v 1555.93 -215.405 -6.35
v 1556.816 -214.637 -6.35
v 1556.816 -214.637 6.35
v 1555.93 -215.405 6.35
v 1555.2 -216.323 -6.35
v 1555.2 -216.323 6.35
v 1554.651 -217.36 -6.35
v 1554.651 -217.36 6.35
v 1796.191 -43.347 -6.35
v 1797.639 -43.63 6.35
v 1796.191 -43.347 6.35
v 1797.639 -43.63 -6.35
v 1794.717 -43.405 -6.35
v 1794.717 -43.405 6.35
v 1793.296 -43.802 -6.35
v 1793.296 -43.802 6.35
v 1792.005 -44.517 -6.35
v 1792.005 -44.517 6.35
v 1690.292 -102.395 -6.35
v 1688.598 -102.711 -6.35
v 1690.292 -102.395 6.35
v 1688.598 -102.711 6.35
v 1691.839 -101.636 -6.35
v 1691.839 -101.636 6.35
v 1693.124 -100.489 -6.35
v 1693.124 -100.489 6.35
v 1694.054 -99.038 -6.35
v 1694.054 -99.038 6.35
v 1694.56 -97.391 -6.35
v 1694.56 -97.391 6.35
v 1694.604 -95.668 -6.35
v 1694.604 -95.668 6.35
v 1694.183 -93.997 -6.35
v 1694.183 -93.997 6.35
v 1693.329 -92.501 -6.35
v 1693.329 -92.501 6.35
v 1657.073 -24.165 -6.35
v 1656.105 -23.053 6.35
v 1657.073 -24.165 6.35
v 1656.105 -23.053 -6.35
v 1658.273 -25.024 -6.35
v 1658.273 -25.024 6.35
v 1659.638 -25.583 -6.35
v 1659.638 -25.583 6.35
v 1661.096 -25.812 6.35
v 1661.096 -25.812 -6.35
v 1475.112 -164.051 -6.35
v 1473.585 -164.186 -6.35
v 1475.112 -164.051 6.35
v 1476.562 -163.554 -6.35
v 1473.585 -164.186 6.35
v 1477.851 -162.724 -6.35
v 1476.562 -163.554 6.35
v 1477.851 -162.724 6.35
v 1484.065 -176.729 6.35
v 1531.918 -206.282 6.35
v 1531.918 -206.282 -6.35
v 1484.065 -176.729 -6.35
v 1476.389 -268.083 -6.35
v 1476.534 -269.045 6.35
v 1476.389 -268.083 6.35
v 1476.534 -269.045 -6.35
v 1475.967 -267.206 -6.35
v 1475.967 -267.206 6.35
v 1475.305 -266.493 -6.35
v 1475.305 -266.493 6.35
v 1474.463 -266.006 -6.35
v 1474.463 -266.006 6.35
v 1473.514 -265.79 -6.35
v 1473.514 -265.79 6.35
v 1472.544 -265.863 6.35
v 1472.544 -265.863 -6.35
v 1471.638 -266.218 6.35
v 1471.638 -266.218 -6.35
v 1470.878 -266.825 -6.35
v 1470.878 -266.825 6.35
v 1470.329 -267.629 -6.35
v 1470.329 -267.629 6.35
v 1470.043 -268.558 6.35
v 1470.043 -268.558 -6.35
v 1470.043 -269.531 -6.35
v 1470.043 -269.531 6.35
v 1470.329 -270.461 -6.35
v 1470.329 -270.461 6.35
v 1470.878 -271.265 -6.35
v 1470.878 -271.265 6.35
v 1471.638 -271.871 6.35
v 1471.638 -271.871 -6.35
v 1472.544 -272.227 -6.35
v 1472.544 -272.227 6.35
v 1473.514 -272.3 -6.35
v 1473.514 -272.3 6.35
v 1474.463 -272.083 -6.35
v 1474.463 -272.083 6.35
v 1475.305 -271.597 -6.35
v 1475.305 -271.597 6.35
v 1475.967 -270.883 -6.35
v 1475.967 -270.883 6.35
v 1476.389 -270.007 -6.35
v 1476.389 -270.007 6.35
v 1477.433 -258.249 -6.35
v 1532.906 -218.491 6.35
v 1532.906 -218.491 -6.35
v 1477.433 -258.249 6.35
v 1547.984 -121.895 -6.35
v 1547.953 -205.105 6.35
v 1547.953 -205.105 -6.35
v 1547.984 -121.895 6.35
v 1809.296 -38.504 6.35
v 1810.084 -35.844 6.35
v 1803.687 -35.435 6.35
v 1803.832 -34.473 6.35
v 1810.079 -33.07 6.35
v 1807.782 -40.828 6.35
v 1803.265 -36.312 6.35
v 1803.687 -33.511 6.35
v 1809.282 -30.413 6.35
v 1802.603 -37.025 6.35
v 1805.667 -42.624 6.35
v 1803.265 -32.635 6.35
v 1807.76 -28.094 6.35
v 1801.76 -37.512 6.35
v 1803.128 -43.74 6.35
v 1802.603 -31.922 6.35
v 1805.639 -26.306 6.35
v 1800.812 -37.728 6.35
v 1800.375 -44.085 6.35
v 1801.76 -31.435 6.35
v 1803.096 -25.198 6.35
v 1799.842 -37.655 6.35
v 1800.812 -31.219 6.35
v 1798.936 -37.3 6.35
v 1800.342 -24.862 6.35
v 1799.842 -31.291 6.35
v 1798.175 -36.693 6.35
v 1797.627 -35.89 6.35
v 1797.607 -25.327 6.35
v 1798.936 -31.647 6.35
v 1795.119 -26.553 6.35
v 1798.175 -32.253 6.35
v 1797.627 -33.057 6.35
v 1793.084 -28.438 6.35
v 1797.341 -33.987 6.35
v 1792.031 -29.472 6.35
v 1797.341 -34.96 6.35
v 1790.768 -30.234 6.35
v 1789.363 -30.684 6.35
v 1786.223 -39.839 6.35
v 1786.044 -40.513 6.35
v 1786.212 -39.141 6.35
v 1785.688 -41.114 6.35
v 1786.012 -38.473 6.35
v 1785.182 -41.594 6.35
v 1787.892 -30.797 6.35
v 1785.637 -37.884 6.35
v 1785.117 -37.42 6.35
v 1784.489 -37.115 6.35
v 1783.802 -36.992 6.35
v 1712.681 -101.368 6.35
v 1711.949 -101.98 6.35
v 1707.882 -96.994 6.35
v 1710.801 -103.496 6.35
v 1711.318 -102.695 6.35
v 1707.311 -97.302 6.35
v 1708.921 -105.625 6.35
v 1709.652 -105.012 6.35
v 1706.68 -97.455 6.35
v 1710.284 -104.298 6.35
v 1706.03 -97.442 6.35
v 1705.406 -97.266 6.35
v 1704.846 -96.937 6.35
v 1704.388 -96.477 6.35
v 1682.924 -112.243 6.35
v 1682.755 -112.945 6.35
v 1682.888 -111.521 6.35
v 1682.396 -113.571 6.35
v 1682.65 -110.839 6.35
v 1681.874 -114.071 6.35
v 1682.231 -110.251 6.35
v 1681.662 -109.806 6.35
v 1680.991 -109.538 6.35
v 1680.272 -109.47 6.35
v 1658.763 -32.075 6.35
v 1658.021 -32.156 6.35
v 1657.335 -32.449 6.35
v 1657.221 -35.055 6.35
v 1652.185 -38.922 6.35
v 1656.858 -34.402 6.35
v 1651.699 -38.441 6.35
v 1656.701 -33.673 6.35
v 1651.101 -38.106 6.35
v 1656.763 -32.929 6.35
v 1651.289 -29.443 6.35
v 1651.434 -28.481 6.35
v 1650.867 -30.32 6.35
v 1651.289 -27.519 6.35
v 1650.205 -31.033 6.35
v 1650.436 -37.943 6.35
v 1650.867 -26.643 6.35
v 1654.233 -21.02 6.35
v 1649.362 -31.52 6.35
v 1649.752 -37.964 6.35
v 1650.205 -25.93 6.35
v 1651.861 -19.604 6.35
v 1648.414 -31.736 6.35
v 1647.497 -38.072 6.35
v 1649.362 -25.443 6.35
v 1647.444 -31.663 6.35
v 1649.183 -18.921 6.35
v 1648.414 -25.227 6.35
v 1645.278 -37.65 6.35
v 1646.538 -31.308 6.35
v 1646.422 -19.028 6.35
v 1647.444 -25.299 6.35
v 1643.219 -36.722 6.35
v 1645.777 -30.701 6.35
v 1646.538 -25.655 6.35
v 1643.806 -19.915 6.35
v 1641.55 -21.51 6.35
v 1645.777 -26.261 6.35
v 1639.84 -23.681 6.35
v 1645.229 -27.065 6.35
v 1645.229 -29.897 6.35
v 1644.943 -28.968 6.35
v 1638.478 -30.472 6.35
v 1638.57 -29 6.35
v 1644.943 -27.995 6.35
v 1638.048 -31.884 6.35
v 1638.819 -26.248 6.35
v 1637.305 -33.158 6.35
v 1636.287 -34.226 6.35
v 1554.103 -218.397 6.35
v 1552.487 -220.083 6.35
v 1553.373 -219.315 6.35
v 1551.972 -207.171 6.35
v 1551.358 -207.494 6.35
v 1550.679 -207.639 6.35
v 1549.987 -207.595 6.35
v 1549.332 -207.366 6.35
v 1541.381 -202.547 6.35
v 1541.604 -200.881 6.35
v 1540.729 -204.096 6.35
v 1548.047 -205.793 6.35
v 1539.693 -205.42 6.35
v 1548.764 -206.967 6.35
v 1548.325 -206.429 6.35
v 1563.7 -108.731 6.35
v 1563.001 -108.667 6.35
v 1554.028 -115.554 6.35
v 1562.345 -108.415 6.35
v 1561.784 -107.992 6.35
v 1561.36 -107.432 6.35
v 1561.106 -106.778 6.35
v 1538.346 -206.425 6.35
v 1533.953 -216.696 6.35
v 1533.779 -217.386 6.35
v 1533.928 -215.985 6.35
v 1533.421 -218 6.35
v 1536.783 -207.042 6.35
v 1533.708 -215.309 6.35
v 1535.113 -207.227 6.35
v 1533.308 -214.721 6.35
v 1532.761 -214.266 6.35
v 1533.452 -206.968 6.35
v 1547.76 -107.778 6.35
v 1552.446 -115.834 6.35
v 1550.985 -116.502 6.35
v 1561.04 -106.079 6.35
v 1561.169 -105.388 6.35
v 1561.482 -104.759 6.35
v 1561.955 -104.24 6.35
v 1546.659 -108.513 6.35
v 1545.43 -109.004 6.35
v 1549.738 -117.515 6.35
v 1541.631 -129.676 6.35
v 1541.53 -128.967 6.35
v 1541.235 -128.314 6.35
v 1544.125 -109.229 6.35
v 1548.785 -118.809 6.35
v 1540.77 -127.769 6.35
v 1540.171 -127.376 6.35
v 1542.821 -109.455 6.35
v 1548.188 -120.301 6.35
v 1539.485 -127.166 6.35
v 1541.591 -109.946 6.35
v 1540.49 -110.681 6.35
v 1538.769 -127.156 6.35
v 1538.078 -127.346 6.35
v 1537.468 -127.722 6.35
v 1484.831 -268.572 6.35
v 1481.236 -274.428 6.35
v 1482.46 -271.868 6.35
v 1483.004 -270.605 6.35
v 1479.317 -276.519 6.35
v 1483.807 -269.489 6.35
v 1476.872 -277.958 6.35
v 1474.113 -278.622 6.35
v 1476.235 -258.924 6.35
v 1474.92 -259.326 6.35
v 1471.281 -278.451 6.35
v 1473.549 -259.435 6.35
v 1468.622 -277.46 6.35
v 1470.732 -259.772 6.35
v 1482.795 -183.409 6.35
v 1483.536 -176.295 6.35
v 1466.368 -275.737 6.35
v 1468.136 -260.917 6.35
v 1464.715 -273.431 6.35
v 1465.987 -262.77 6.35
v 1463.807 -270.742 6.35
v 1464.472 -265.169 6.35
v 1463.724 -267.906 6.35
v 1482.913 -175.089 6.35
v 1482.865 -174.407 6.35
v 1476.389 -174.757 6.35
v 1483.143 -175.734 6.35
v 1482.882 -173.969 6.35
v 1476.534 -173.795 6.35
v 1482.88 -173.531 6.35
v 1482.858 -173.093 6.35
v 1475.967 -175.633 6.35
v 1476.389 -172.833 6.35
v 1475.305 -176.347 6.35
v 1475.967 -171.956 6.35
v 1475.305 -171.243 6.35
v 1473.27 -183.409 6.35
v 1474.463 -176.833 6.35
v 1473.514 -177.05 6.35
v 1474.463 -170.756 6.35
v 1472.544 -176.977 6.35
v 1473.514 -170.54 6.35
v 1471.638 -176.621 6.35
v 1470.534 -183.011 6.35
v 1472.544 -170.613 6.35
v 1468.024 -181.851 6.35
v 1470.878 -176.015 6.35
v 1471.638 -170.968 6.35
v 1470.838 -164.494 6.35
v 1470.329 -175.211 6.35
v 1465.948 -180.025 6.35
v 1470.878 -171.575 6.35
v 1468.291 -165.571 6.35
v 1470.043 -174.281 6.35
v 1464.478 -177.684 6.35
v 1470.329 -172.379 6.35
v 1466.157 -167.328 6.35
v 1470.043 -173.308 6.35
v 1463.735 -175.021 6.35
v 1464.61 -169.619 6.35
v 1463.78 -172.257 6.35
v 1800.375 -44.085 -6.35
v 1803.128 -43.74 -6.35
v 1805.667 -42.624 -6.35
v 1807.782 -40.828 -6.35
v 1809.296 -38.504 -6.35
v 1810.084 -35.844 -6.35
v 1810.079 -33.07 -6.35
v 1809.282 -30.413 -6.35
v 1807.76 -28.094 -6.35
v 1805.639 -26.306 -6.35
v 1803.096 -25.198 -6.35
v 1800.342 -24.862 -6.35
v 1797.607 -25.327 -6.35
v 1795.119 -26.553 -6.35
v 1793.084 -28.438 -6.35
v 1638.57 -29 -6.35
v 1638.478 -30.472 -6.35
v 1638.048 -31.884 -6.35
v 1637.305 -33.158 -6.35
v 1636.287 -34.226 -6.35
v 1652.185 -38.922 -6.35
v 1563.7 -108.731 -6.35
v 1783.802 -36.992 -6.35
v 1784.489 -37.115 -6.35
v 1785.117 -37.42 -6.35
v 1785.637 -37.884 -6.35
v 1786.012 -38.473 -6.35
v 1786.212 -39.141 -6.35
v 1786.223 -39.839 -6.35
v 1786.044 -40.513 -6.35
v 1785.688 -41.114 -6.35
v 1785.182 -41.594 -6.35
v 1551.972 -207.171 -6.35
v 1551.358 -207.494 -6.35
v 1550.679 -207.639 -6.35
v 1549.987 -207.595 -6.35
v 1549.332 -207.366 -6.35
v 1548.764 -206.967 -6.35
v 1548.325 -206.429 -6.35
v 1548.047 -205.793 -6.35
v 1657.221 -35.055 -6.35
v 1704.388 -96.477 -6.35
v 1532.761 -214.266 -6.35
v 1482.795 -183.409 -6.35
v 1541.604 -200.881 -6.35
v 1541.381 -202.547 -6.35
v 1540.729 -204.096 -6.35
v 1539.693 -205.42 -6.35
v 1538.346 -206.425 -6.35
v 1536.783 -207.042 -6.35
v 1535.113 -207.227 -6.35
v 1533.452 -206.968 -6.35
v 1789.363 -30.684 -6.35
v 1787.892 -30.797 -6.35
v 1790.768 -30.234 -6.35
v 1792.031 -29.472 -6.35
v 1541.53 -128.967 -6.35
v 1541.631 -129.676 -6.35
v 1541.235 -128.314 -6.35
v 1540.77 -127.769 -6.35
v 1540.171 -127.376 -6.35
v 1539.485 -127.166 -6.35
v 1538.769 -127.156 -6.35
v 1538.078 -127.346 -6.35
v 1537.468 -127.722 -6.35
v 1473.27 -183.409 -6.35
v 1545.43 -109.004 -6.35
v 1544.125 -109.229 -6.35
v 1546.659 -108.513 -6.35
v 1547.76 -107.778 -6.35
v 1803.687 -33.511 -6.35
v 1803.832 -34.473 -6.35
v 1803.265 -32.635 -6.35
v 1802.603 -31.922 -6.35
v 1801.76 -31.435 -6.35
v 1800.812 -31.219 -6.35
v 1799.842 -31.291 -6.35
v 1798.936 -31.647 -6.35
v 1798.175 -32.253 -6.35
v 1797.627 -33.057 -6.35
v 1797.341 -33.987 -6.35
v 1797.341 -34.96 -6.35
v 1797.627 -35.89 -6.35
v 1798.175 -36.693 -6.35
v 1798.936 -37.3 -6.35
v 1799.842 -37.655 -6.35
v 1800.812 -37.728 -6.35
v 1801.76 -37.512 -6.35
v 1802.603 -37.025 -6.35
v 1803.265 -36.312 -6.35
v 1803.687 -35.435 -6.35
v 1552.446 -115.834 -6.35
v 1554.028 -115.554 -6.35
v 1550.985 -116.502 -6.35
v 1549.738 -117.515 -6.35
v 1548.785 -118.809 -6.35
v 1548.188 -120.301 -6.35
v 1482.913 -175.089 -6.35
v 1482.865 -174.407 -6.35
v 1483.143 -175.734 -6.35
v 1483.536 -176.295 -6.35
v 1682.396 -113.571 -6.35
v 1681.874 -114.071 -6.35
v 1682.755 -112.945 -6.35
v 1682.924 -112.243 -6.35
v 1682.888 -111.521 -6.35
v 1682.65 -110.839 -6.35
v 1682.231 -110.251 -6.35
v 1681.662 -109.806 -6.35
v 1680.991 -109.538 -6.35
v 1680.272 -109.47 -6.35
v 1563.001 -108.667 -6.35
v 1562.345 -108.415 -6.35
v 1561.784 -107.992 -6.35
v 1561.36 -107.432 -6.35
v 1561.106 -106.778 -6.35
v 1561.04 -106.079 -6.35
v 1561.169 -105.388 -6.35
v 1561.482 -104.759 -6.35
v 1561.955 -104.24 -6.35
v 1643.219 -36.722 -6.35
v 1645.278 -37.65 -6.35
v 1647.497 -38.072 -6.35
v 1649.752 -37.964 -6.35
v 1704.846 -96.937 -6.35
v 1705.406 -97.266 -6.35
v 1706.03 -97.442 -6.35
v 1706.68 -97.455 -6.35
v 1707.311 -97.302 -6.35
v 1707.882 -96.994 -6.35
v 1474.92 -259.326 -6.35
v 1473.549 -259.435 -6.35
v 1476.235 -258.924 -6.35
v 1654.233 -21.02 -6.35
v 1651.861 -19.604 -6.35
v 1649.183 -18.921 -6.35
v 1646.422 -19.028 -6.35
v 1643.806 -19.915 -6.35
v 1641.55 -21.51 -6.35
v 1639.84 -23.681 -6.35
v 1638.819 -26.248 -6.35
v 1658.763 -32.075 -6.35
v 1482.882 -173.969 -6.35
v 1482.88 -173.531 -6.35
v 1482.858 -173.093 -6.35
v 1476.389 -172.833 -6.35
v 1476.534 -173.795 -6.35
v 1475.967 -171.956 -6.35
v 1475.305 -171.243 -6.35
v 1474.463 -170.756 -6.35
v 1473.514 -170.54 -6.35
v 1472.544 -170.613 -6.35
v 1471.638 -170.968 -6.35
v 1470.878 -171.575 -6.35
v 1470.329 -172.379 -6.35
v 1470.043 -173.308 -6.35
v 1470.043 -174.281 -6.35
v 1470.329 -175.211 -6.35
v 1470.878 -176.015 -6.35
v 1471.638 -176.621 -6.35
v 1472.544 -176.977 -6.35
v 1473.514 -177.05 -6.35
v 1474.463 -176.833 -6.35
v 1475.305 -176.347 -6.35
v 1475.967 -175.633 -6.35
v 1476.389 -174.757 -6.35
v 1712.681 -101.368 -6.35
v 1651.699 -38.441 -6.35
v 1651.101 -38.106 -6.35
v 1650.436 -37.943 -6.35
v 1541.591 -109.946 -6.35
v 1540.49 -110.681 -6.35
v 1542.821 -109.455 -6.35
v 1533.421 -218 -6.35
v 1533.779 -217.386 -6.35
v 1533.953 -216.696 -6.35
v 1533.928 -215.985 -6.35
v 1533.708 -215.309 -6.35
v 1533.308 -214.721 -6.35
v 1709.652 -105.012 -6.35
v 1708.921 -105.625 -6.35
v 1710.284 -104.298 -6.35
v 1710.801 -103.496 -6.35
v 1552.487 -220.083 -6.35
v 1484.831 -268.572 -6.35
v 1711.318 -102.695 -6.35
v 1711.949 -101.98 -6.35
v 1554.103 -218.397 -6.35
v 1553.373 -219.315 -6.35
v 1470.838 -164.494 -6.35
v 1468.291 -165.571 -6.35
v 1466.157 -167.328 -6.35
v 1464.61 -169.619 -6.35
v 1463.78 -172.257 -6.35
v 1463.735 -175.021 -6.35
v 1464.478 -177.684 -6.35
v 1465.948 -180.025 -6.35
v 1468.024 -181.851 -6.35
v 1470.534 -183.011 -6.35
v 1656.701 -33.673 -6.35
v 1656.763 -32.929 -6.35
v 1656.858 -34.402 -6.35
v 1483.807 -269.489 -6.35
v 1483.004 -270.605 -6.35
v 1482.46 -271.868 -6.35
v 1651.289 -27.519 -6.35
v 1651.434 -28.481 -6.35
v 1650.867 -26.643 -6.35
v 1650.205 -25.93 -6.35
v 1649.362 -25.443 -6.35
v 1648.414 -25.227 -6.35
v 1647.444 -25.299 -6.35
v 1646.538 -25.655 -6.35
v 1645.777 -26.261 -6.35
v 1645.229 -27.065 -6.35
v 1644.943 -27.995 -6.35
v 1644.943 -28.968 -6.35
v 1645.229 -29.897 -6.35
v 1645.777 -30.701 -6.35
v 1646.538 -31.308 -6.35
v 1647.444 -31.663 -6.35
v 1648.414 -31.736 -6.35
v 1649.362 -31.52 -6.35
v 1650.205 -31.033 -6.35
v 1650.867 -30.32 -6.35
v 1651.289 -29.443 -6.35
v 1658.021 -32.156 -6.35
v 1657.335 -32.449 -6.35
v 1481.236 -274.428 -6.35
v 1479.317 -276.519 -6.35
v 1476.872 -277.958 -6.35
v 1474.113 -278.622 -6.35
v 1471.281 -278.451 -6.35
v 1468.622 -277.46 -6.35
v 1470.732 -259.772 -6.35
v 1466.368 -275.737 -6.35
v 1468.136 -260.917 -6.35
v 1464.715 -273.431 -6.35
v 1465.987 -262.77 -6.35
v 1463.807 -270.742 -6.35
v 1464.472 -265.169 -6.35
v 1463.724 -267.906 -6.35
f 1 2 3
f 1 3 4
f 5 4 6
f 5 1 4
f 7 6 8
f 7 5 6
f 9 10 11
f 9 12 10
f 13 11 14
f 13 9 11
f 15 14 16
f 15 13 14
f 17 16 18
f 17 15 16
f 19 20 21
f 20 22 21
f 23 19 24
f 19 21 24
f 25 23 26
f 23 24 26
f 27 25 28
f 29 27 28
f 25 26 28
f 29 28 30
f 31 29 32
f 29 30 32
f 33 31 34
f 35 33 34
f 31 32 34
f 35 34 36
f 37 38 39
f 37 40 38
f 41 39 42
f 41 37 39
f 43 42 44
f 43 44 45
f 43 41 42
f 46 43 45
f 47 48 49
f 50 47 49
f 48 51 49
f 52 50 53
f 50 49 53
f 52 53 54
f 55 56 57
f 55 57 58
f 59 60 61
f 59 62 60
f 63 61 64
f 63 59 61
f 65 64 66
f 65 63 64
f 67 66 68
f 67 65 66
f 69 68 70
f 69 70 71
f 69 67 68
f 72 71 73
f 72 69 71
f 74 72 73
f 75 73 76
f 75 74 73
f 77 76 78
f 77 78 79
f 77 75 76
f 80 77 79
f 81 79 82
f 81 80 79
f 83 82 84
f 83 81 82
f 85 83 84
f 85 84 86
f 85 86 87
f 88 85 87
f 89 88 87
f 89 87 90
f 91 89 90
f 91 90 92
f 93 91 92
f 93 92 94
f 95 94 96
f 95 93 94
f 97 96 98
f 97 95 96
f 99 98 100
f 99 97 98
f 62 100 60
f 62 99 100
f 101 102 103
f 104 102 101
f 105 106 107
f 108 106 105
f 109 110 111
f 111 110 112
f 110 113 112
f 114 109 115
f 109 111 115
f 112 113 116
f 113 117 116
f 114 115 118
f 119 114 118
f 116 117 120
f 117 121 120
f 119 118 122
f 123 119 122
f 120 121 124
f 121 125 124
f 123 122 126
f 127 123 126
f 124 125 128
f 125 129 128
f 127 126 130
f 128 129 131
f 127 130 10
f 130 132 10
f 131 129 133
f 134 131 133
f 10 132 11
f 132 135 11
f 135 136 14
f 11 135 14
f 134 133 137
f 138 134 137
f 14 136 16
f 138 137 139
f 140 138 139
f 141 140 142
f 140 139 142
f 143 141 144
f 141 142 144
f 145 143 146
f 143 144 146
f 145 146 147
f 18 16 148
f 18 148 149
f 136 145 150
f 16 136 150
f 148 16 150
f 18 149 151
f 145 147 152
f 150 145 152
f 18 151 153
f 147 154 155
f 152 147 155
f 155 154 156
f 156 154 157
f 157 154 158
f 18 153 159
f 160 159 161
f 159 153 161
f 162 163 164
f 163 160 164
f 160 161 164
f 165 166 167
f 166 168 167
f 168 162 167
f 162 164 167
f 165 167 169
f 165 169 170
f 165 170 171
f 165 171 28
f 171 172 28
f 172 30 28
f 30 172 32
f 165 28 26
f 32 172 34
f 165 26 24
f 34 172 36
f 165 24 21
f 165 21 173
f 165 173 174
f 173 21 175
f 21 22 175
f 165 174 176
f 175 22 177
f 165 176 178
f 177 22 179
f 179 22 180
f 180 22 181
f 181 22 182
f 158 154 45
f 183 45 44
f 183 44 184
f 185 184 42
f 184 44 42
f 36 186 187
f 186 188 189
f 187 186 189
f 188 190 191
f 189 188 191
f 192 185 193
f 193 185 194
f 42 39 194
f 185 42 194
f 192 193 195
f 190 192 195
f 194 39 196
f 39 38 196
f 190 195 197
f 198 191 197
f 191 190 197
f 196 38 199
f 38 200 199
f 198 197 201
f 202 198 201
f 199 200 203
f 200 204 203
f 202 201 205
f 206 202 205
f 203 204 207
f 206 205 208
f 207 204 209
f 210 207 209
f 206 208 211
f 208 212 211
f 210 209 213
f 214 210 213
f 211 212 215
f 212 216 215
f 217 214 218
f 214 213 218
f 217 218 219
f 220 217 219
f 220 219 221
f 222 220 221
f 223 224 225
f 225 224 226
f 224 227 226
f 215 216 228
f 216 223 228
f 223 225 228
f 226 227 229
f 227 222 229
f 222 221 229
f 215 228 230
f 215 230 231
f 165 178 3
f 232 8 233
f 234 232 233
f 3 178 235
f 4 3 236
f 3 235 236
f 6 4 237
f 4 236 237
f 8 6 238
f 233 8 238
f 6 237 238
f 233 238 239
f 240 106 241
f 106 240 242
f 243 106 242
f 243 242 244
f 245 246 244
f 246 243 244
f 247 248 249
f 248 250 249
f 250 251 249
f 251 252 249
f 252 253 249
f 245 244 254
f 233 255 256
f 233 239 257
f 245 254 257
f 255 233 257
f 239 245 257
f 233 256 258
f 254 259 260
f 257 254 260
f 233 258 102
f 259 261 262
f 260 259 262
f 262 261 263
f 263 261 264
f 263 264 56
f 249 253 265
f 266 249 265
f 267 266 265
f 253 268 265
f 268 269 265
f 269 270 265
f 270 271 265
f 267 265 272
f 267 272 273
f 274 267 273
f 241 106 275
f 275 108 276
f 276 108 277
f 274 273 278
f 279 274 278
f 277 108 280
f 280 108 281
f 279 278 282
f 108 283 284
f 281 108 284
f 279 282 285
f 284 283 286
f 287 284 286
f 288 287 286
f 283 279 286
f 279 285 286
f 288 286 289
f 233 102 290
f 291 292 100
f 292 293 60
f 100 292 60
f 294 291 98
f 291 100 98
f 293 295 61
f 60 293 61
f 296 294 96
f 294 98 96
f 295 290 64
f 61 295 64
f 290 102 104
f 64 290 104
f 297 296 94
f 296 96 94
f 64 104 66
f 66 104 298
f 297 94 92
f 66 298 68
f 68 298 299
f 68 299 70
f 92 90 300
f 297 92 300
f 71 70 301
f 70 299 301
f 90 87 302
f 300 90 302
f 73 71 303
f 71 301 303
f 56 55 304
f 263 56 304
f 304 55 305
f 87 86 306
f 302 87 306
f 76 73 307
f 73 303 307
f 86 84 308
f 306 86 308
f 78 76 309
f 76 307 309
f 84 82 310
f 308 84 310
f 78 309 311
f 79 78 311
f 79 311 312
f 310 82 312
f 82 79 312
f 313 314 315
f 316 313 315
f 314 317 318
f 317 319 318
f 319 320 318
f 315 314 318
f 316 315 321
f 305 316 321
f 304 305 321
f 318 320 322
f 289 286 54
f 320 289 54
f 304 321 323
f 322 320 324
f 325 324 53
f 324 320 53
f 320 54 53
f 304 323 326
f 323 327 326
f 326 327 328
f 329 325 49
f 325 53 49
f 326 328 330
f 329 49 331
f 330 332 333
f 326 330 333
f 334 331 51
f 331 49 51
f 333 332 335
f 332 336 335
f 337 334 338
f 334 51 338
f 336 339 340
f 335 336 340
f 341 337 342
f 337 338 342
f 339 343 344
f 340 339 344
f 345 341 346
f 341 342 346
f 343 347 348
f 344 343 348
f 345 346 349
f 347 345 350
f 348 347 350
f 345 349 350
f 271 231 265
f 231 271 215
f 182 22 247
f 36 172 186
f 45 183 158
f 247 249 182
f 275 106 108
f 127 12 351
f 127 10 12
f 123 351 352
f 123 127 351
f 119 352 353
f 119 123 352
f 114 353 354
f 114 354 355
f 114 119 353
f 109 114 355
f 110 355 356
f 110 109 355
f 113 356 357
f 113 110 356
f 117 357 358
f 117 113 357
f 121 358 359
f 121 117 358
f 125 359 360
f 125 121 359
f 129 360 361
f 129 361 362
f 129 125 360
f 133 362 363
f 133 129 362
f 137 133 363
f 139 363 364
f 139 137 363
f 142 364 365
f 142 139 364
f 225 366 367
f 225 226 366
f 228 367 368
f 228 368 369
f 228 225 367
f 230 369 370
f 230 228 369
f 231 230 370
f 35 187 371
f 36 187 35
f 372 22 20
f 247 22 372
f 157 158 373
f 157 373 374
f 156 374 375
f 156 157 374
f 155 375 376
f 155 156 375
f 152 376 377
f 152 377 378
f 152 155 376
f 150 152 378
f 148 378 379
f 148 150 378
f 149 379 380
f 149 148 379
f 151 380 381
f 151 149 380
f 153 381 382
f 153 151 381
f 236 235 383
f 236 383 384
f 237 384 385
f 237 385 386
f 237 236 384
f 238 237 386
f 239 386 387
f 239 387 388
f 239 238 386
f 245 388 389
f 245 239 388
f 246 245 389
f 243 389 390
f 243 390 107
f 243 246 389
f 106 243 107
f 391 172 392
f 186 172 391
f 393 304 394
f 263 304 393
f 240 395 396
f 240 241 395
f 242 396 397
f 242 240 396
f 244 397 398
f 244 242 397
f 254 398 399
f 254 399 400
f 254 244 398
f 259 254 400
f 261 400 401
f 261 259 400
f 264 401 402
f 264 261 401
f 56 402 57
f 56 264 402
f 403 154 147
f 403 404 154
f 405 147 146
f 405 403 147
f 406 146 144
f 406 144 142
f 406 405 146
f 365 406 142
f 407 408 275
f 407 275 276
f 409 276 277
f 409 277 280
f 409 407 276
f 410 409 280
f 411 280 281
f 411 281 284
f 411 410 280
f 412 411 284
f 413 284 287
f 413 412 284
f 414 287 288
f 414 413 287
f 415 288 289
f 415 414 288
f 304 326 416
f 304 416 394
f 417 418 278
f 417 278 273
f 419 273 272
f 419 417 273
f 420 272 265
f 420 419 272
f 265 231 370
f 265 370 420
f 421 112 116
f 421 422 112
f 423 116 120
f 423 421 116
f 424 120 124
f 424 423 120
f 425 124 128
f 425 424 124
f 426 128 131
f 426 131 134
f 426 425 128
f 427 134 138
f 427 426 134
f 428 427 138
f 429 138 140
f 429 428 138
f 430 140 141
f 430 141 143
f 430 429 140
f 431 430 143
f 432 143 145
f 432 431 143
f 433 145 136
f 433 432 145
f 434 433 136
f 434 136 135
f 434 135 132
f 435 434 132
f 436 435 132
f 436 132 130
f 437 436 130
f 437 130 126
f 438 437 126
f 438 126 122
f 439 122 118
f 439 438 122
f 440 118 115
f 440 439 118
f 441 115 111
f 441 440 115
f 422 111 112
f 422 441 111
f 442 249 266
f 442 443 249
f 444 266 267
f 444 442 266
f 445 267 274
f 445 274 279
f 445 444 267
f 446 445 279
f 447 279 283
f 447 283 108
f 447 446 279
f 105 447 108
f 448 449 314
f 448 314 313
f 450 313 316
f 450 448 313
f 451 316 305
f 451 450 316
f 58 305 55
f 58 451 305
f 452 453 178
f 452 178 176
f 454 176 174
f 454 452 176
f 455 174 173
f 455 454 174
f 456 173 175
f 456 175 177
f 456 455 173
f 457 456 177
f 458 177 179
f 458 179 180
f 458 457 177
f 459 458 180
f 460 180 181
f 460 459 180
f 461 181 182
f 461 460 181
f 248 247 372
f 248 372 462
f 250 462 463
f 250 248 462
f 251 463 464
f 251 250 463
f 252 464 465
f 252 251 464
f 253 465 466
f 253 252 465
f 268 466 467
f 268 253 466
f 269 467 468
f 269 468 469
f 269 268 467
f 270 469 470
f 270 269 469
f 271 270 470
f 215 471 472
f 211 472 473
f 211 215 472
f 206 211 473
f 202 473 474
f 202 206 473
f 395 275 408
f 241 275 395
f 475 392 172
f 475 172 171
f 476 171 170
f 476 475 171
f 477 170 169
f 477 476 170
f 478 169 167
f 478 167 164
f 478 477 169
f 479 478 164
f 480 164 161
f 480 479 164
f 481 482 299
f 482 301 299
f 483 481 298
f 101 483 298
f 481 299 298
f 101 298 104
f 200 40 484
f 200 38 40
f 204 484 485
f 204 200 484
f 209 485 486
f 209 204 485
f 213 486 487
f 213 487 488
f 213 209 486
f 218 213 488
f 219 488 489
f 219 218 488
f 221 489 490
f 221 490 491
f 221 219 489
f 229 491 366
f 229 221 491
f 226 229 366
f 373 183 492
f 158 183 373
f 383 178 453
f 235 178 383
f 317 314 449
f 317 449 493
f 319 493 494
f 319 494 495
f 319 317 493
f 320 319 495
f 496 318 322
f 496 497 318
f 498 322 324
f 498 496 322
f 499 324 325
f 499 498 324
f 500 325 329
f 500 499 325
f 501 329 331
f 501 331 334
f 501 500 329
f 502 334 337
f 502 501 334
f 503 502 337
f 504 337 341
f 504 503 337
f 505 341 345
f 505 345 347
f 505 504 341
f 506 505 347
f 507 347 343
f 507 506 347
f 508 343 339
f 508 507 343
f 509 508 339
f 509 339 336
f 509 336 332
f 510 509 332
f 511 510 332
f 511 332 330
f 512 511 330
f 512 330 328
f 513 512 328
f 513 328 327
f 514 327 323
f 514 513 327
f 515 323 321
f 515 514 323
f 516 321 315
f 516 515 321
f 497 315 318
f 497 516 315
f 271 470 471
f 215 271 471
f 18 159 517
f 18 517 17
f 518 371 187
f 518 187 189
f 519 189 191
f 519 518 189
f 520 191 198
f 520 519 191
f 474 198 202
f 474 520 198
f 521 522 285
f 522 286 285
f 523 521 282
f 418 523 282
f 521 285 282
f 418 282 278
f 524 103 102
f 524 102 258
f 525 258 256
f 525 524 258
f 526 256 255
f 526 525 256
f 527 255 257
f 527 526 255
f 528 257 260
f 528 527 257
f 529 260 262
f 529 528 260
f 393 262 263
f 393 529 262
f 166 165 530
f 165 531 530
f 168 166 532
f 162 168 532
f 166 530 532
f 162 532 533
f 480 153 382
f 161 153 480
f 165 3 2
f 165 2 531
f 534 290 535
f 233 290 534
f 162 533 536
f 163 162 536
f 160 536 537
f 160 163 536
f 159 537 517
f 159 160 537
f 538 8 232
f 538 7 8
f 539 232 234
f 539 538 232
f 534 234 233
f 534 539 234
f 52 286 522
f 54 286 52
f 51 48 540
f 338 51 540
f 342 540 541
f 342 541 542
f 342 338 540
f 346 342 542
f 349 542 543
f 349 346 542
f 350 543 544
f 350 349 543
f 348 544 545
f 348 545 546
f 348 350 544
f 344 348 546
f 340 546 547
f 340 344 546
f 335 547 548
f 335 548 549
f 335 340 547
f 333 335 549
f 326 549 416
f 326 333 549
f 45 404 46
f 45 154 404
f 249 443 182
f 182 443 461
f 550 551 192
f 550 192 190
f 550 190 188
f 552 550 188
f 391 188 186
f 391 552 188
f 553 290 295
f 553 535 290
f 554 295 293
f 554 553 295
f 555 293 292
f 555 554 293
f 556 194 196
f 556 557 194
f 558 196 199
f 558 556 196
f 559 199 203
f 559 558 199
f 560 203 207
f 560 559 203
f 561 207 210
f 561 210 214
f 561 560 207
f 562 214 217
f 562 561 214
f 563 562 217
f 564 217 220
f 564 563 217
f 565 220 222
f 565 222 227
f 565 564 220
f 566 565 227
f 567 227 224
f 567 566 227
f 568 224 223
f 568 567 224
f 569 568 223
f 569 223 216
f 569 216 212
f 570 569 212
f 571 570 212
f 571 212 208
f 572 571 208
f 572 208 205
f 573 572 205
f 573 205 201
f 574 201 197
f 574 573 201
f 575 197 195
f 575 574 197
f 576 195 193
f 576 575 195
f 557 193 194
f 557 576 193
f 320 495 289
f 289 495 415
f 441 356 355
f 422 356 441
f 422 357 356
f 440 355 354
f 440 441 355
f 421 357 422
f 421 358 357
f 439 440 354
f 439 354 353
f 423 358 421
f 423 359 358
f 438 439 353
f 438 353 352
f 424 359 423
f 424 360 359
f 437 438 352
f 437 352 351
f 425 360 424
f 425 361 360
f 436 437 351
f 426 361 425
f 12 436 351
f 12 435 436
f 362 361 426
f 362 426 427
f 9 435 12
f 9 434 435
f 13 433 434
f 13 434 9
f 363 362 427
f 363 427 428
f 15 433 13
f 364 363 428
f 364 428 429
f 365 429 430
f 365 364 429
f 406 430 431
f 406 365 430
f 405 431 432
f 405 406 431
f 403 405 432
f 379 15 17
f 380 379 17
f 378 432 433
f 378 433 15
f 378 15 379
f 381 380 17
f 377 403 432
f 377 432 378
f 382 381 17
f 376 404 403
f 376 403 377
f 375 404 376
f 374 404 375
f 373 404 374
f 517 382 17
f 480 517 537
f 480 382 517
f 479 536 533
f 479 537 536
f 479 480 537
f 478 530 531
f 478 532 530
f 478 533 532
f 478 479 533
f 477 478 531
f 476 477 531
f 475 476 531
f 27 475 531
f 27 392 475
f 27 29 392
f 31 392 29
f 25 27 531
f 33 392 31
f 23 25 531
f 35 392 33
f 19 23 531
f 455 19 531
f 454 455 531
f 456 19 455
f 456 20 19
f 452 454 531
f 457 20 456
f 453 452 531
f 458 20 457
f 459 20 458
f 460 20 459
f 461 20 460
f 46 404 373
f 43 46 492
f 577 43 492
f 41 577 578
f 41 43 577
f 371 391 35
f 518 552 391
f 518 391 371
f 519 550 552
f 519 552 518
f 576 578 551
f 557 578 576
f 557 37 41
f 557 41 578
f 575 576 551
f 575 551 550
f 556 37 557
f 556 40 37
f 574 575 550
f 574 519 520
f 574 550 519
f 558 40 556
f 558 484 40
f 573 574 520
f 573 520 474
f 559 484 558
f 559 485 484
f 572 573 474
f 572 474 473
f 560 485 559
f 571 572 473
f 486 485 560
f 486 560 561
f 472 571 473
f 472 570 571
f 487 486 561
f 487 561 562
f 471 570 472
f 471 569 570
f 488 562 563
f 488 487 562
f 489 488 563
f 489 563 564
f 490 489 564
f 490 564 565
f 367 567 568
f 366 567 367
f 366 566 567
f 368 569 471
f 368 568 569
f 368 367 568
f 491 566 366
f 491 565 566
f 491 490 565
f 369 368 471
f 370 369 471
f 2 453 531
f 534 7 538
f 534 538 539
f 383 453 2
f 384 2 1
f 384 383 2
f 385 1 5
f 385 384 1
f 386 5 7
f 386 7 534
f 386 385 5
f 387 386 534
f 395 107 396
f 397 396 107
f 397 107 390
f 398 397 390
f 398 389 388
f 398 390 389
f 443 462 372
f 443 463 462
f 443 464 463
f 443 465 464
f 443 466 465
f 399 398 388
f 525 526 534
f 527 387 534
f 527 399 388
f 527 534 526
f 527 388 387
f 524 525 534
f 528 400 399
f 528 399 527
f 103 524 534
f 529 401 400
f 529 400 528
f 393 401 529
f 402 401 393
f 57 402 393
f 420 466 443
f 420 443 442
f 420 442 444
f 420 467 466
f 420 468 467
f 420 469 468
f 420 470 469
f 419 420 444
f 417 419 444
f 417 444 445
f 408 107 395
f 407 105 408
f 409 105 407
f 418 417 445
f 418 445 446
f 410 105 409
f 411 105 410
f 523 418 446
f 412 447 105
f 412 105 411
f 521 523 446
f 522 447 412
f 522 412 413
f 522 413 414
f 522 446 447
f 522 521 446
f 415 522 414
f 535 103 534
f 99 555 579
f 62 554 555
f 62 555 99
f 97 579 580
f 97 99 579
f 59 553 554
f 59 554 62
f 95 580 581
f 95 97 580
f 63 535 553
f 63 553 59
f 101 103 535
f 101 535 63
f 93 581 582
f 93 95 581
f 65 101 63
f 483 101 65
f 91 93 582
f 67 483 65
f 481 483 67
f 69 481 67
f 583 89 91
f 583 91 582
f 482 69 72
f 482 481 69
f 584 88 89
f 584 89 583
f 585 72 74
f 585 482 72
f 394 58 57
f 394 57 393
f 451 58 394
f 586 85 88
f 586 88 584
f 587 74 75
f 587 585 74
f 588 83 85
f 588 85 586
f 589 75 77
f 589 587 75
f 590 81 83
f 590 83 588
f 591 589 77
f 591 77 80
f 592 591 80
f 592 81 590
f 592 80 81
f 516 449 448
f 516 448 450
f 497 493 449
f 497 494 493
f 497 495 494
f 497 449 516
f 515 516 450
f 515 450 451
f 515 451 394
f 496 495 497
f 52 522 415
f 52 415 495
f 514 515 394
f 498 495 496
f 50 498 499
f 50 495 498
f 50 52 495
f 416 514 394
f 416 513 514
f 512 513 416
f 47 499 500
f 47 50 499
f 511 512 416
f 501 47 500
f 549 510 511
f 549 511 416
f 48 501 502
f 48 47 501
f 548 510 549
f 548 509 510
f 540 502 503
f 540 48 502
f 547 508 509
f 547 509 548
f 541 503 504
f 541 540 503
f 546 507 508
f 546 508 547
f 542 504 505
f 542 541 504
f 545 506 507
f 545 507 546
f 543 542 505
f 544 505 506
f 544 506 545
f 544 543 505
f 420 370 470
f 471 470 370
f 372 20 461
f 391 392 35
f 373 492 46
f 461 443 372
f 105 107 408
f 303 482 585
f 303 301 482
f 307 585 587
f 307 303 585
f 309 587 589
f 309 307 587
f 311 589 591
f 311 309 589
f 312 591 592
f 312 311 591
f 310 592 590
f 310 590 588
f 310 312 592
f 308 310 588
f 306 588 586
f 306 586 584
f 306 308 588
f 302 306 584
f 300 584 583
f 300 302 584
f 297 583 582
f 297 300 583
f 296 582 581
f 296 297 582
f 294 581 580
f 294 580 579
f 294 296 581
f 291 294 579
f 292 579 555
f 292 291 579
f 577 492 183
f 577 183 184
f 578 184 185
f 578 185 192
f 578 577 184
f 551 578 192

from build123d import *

# Parameters (mm, degrees)
SKETCH1_R           = 3.2639
BOSS_EXTRUDE1_DEPTH = 6.35
FILLET2_R           = 6.35
FILLET3_R           = 2.54
FILLET6_R           = 6.35
FILLET7_R           = 6.35


with BuildPart() as part:
    # Sketch1 → Boss-Extrude1 (new, symmetric)
    with BuildSketch(Plane.XY):
        with BuildLine():
            ThreePointArc((1657.362226857, -25.665303386), (1645.082138382, -19.376819434), (1639.161234094, -31.838299916))
            Line((1639.161234094, -31.838299916), (1543.928298612, -110.961407638))
            Line((1543.928298612, -110.961407638), (1542.386268966, -109.105413681))
            Line((1542.386268966, -109.105413681), (1475.716388889, -164.497259751))
            ThreePointArc((1475.716388889, -164.497259751), (1463.735668917, -172.561408735), (1473.270132637, -183.40862734))
            Line((1473.270132637, -183.40862734), (1482.795132637, -183.40862734))
            Line((1482.795132637, -183.40862734), (1536.006430236, -216.269775409))
            Line((1536.006430236, -216.269775409), (1475.438186342, -259.678478553))
            ThreePointArc((1475.438186342, -259.678478553), (1465.455879345, -274.64513078), (1482.83634148, -270.00113812))
            Line((1482.83634148, -270.00113812), (1554.239311773, -218.827286252))
            Line((1554.239311773, -218.827286252), (1553.129588502, -217.278887316))
            Line((1553.129588502, -217.278887316), (1710.323691942, -104.61931964))
            Line((1710.323691942, -104.61931964), (1709.583876428, -103.587053683))
            Line((1709.583876428, -103.587053683), (1795.041714347, -42.340207499))
            ThreePointArc((1795.041714347, -42.340207499), (1809.776954687, -31.712536315), (1791.625246623, -30.944293485))
            Line((1791.625246623, -30.944293485), (1657.362226857, -25.665303386))
        make_face()
        with BuildLine():
            Line((1700.720652168, -102.126820321), (1556.109252329, -109.096723899))
            Line((1556.109252329, -109.096723899), (1643.219206848, -36.72249454))
            ThreePointArc((1643.219206848, -36.72249454), (1647.101886478, -38.035715693), (1651.178708707, -37.612311142))
            Line((1651.178708707, -37.612311142), (1700.720652168, -102.126820321))
        make_face(mode=Mode.SUBTRACT)
        with BuildLine():
            ThreePointArc((1482.659265028, -175.861431519), (1482.859244436, -174.484660756), (1482.858420935, -173.093442291))
            Line((1482.858420935, -173.093442291), (1541.633109373, -124.261218638))
            Line((1541.633109373, -124.261218638), (1541.60005002, -212.260879574))
            Line((1541.60005002, -212.260879574), (1482.659265028, -175.861431519))
        make_face(mode=Mode.SUBTRACT)
        with Locations((1473.270132637, -269.04472734)):
            Circle(SKETCH1_R, mode=Mode.SUBTRACT)
        with Locations((1473.270132637, -173.79472734)):
            Circle(SKETCH1_R, mode=Mode.SUBTRACT)
        Polygon((1547.986271365, -115.845602263), (1688.873329523, -109.05520253), (1547.950879905, -210.053025619), align=None, mode=Mode.SUBTRACT)
        with Locations((1648.169999473, -28.481334088)):
            Circle(SKETCH1_R, mode=Mode.SUBTRACT)
        with BuildLine():
            Line((1705.884798859, -98.425723899), (1656.215061092, -33.744798419))
            ThreePointArc((1656.215061092, -33.744798419), (1656.708059099, -32.900452896), (1657.112748585, -32.010400752))
            Line((1657.112748585, -32.010400752), (1791.19818023, -37.282408394))
            Line((1791.19818023, -37.282408394), (1705.884798859, -98.425723899))
        make_face(mode=Mode.SUBTRACT)
        with Locations((1800.567995736, -34.473360149)):
            Circle(SKETCH1_R, mode=Mode.SUBTRACT)
    extrude(amount=BOSS_EXTRUDE1_DEPTH, both=True)

    # Fillet2
    fillet2_edges = [part.edges().sort_by_distance(p)[0] for p in [
        (1541.60005002, -212.260879574, 0),
        (1547.986271365, -115.845602263, 0),
        (1700.720652168, -102.126820321, 0),
        (1791.625246623, -30.944293485, 0),
        (1795.041714347, -42.340207499, 0),
        (1482.83634148, -270.00113812, 0),
        (1475.438186342, -259.678478553, 0),
        (1475.716388889, -164.497259751, 0),
        (1639.161234094, -31.838299916, 0),
        (1657.362226857, -25.665303386, 0),
    ]]
    fillet(fillet2_edges, radius=FILLET2_R)

    # Fillet3
    # the kernel refuses this fillet: 2.54 mm, written as the material it adds along each edge
    with BuildSketch(Plane(origin=(1482.659265028, -175.861431519, -6.35), x_dir=(0.8508312617816599, -0.5254390202250196, 0), z_dir=(0, 0, 1)), Plane(origin=(1656.215061092, -33.744798419, -6.35), x_dir=(0.6090571217254737, -0.7931263597154502, 0), z_dir=(0, 0, 1))) as fillet3_piece_1:
        with BuildLine():
            CenterArc((1.651924419, 2.54), FILLET3_R, 208.048541525, 61.951458475)
            ThreePointArc((-0.5897514, 1.345642633), (-0.269132792, 0.684103596), (0, 0))
            Line((0, 0), (1.651924419, 0))
        make_face()
    extrude(amount=12.7)
    with BuildSketch(Plane(origin=(1541.633109373, -124.261218638, -6.35), x_dir=(-0.00037567588921249087, -0.9999999294338106, 0), z_dir=(0, 0, 1))) as fillet3_piece_2:
        with BuildLine():
            CenterArc((FILLET3_R * 2.13199085195, -FILLET3_R), FILLET3_R, 90, 129.742603087)
            Line((FILLET3_R * 1.36306647439, -FILLET3_R * 1.63933973879), (0, 0))
            Line((0, 0), (FILLET3_R * 2.13199085195, 0))
        make_face()
    extrude(amount=12.7)
    with BuildSketch(Plane(origin=(1547.950879905, -210.053025619, 6.35), x_dir=(0.8128078399508512, 0.5825319006839296, 0), z_dir=(0, 0, -1))) as fillet3_piece_3:
        with BuildLine():
            CenterArc((FILLET3_R * 1.94789411365, -FILLET3_R), FILLET3_R, 90, 125.650345443)
            Line((FILLET3_R * 1.13530517425, -FILLET3_R * 1.58283721188), (0, 0))
            Line((0, 0), (FILLET3_R * 1.94789411365, 0))
        make_face()
    extrude(amount=12.7)
    with BuildSketch(Plane(origin=(1688.873329523, -109.05520253, -6.35), x_dir=(-0.9988405216590461, -0.04814158588875568, 0), z_dir=(0, 0, 1))) as fillet3_piece_4:
        with BuildLine():
            CenterArc((FILLET3_R * 3.39012199782, FILLET3_R), FILLET3_R, 122.869444547, 147.130555453)
            Line((FILLET3_R * 2.8473953887, FILLET3_R * 1.83990941639), (0, 0))
            Line((0, 0), (FILLET3_R * 3.39012199782, 0))
        make_face()
    extrude(amount=12.7)
    with BuildSketch(Plane(origin=(1705.884798859, -98.425723899, -6.35), x_dir=(-0.6090571217254714, 0.7931263597154518, 0), z_dir=(0, 0, 1))) as fillet3_piece_5:
        with BuildLine():
            CenterArc((FILLET3_R * 0.967502749894, -FILLET3_R), FILLET3_R, 90, 88.10746289)
            Line((-FILLET3_R * 0.0319517760986, -FILLET3_R * 0.966975002291), (0, 0))
            Line((0, 0), (FILLET3_R * 0.967502749894, 0))
        make_face()
    extrude(amount=12.7)
    with BuildSketch(Plane(origin=(1791.19818023, -37.282408394, 6.35), x_dir=(-0.9992279317494432, 0.03928791686676534, 0), z_dir=(0, 0, -1))) as fillet3_piece_6:
        with BuildLine():
            CenterArc((FILLET3_R * 2.91408494962, -FILLET3_R), FILLET3_R, 90, 142.119567883)
            Line((FILLET3_R * 2.30006927648, -FILLET3_R * 1.78929383194), (0, 0))
            Line((0, 0), (FILLET3_R * 2.91408494962, 0))
        make_face()
    extrude(amount=12.7)
    with BuildSketch(Plane(origin=(1657.112748585, -32.010400752, -6.35), x_dir=(-0.4370826010652276, -0.8994213694626424, 0), z_dir=(0, 0, 1))) as fillet3_piece_7:
        with BuildLine():
            CenterArc((1.663286591, 2.532574185), FILLET3_R, 203.666275918, 61.951458475)
            Line((-0.663096919, 1.512995956), (0, 0))
            ThreePointArc((0, 0), (0.734602071, 0.02810671), (1.469204142, 0))
        make_face()
    extrude(amount=12.7)
    with BuildSketch(Plane(origin=(1556.109252329, -109.096723899, 6.35), x_dir=(0.9988405216590459, 0.048141585888763216, 0), z_dir=(0, 0, -1))) as fillet3_piece_8:
        with BuildLine():
            CenterArc((FILLET3_R * 2.99200774925, -FILLET3_R), FILLET3_R, 90, 143.038297809)
            Line((FILLET3_R * 2.39072668673, -FILLET3_R * 1.79903759853), (0, 0))
            Line((0, 0), (FILLET3_R * 2.99200774925, 0))
        make_face()
    extrude(amount=12.7)
    with BuildSketch(Plane(origin=(1651.178708707, -37.612311142, -6.35), x_dir=(0.6090571217254943, -0.7931263597154341, 0), z_dir=(0, 0, 1))) as fillet3_piece_9:
        with BuildLine():
            CenterArc((1.651924419, -2.54), FILLET3_R, 90, 61.951458475)
            ThreePointArc((-0.5897514, -1.345642633), (-0.269132792, -0.684103596), (0, 0))
            Line((0, 0), (1.651924419, 0))
        make_face()
    extrude(amount=12.7)
    with BuildSketch(Plane(origin=(1536.006430236, -216.269775409, -6.35), x_dir=(-0.8508312617816903, 0.5254390202249702, 0), z_dir=(0, 0, 1))) as fillet3_piece_10:
        with BuildLine():
            CenterArc((FILLET3_R * 1.50151874055, FILLET3_R), FILLET3_R, 157.326623381, 112.673376619)
            Line((FILLET3_R * 0.578801433411, FILLET3_R * 1.38547732891), (0, 0))
            Line((0, 0), (FILLET3_R * 1.50151874055, 0))
        make_face()
    extrude(amount=12.7)

    # Fillet6
    # the kernel refuses this fillet: 6.35 mm, written as the material it adds along each edge
    with BuildSketch(Plane(origin=(1543.928298612, -110.961407638, -6.35), x_dir=(-0.6390508273261215, 0.7691645078224811, 0), z_dir=(0, 0, 1))) as fillet6_piece_1:
        with BuildLine():
            CenterArc((6.35, -4.982221492), FILLET6_R, 128.316134474, 51.683865526)
            Line((0, -4.982221492), (-0.127, -4.982221492))
            Line((-0.127, -4.982221492), (-0.127, 0))
            Line((-0.127, 0), (0, 0.127))
            ThreePointArc((0, 0.127), (1.2065, 0.127), (2.33426, 0.09964443))
            Line((2.33426, 0.09964443), (2.413, 0))
        make_face()
    extrude(amount=12.7)
    with BuildSketch(Plane(origin=(1709.583876428, -103.587053683, 6.35), x_dir=(0.8128078399508694, 0.582531900683904, 0), z_dir=(0, 0, -1))) as fillet6_piece_2:
        with BuildLine():
            CenterArc((3.81, 6.35), FILLET6_R, 233.130102354, 36.869897646)
            Line((0, 1.27), (-0.0762, 1.1684))
            ThreePointArc((-0.0762, 1.1684), (-0.127, 0.635), (-0.127, 0))
            Line((-0.127, 0), (0, -0.127))
            Line((0, -0.127), (3.81, -0.127))
            Line((3.81, -0.127), (3.81, 0))
        make_face()
    extrude(amount=12.7)
    with BuildSketch(Plane(origin=(1553.129588502, -217.278887316, -6.35), x_dir=(0.8128078399508519, 0.5825319006839285, 0), z_dir=(0, 0, 1))) as fillet6_piece_3:
        with BuildLine():
            CenterArc((4.534807052, -6.35), FILLET6_R, 90, 45.572995999)
            Line((0, -1.905), (-0.090696141, -1.8161))
            ThreePointArc((-0.090696141, -1.8161), (-0.127, -0.9525), (-0.127, 0))
            Line((-0.127, 0), (0, 0.127))
            Line((0, 0.127), (4.534807052, 0.127))
            Line((4.534807052, 0.127), (4.534807052, 0))
        make_face()
    extrude(amount=12.7)

    # Fillet7
    fillet7_edges = [part.edges().sort_by_distance(p)[0] for p in [
        (1710.323691942, -104.61931964, 0),
        (1554.239311773, -218.827286252, 0),
        (1542.386268966, -109.105413681, 0),
    ]]
    fillet(fillet7_edges, radius=FILLET7_R)


solid = part.part
